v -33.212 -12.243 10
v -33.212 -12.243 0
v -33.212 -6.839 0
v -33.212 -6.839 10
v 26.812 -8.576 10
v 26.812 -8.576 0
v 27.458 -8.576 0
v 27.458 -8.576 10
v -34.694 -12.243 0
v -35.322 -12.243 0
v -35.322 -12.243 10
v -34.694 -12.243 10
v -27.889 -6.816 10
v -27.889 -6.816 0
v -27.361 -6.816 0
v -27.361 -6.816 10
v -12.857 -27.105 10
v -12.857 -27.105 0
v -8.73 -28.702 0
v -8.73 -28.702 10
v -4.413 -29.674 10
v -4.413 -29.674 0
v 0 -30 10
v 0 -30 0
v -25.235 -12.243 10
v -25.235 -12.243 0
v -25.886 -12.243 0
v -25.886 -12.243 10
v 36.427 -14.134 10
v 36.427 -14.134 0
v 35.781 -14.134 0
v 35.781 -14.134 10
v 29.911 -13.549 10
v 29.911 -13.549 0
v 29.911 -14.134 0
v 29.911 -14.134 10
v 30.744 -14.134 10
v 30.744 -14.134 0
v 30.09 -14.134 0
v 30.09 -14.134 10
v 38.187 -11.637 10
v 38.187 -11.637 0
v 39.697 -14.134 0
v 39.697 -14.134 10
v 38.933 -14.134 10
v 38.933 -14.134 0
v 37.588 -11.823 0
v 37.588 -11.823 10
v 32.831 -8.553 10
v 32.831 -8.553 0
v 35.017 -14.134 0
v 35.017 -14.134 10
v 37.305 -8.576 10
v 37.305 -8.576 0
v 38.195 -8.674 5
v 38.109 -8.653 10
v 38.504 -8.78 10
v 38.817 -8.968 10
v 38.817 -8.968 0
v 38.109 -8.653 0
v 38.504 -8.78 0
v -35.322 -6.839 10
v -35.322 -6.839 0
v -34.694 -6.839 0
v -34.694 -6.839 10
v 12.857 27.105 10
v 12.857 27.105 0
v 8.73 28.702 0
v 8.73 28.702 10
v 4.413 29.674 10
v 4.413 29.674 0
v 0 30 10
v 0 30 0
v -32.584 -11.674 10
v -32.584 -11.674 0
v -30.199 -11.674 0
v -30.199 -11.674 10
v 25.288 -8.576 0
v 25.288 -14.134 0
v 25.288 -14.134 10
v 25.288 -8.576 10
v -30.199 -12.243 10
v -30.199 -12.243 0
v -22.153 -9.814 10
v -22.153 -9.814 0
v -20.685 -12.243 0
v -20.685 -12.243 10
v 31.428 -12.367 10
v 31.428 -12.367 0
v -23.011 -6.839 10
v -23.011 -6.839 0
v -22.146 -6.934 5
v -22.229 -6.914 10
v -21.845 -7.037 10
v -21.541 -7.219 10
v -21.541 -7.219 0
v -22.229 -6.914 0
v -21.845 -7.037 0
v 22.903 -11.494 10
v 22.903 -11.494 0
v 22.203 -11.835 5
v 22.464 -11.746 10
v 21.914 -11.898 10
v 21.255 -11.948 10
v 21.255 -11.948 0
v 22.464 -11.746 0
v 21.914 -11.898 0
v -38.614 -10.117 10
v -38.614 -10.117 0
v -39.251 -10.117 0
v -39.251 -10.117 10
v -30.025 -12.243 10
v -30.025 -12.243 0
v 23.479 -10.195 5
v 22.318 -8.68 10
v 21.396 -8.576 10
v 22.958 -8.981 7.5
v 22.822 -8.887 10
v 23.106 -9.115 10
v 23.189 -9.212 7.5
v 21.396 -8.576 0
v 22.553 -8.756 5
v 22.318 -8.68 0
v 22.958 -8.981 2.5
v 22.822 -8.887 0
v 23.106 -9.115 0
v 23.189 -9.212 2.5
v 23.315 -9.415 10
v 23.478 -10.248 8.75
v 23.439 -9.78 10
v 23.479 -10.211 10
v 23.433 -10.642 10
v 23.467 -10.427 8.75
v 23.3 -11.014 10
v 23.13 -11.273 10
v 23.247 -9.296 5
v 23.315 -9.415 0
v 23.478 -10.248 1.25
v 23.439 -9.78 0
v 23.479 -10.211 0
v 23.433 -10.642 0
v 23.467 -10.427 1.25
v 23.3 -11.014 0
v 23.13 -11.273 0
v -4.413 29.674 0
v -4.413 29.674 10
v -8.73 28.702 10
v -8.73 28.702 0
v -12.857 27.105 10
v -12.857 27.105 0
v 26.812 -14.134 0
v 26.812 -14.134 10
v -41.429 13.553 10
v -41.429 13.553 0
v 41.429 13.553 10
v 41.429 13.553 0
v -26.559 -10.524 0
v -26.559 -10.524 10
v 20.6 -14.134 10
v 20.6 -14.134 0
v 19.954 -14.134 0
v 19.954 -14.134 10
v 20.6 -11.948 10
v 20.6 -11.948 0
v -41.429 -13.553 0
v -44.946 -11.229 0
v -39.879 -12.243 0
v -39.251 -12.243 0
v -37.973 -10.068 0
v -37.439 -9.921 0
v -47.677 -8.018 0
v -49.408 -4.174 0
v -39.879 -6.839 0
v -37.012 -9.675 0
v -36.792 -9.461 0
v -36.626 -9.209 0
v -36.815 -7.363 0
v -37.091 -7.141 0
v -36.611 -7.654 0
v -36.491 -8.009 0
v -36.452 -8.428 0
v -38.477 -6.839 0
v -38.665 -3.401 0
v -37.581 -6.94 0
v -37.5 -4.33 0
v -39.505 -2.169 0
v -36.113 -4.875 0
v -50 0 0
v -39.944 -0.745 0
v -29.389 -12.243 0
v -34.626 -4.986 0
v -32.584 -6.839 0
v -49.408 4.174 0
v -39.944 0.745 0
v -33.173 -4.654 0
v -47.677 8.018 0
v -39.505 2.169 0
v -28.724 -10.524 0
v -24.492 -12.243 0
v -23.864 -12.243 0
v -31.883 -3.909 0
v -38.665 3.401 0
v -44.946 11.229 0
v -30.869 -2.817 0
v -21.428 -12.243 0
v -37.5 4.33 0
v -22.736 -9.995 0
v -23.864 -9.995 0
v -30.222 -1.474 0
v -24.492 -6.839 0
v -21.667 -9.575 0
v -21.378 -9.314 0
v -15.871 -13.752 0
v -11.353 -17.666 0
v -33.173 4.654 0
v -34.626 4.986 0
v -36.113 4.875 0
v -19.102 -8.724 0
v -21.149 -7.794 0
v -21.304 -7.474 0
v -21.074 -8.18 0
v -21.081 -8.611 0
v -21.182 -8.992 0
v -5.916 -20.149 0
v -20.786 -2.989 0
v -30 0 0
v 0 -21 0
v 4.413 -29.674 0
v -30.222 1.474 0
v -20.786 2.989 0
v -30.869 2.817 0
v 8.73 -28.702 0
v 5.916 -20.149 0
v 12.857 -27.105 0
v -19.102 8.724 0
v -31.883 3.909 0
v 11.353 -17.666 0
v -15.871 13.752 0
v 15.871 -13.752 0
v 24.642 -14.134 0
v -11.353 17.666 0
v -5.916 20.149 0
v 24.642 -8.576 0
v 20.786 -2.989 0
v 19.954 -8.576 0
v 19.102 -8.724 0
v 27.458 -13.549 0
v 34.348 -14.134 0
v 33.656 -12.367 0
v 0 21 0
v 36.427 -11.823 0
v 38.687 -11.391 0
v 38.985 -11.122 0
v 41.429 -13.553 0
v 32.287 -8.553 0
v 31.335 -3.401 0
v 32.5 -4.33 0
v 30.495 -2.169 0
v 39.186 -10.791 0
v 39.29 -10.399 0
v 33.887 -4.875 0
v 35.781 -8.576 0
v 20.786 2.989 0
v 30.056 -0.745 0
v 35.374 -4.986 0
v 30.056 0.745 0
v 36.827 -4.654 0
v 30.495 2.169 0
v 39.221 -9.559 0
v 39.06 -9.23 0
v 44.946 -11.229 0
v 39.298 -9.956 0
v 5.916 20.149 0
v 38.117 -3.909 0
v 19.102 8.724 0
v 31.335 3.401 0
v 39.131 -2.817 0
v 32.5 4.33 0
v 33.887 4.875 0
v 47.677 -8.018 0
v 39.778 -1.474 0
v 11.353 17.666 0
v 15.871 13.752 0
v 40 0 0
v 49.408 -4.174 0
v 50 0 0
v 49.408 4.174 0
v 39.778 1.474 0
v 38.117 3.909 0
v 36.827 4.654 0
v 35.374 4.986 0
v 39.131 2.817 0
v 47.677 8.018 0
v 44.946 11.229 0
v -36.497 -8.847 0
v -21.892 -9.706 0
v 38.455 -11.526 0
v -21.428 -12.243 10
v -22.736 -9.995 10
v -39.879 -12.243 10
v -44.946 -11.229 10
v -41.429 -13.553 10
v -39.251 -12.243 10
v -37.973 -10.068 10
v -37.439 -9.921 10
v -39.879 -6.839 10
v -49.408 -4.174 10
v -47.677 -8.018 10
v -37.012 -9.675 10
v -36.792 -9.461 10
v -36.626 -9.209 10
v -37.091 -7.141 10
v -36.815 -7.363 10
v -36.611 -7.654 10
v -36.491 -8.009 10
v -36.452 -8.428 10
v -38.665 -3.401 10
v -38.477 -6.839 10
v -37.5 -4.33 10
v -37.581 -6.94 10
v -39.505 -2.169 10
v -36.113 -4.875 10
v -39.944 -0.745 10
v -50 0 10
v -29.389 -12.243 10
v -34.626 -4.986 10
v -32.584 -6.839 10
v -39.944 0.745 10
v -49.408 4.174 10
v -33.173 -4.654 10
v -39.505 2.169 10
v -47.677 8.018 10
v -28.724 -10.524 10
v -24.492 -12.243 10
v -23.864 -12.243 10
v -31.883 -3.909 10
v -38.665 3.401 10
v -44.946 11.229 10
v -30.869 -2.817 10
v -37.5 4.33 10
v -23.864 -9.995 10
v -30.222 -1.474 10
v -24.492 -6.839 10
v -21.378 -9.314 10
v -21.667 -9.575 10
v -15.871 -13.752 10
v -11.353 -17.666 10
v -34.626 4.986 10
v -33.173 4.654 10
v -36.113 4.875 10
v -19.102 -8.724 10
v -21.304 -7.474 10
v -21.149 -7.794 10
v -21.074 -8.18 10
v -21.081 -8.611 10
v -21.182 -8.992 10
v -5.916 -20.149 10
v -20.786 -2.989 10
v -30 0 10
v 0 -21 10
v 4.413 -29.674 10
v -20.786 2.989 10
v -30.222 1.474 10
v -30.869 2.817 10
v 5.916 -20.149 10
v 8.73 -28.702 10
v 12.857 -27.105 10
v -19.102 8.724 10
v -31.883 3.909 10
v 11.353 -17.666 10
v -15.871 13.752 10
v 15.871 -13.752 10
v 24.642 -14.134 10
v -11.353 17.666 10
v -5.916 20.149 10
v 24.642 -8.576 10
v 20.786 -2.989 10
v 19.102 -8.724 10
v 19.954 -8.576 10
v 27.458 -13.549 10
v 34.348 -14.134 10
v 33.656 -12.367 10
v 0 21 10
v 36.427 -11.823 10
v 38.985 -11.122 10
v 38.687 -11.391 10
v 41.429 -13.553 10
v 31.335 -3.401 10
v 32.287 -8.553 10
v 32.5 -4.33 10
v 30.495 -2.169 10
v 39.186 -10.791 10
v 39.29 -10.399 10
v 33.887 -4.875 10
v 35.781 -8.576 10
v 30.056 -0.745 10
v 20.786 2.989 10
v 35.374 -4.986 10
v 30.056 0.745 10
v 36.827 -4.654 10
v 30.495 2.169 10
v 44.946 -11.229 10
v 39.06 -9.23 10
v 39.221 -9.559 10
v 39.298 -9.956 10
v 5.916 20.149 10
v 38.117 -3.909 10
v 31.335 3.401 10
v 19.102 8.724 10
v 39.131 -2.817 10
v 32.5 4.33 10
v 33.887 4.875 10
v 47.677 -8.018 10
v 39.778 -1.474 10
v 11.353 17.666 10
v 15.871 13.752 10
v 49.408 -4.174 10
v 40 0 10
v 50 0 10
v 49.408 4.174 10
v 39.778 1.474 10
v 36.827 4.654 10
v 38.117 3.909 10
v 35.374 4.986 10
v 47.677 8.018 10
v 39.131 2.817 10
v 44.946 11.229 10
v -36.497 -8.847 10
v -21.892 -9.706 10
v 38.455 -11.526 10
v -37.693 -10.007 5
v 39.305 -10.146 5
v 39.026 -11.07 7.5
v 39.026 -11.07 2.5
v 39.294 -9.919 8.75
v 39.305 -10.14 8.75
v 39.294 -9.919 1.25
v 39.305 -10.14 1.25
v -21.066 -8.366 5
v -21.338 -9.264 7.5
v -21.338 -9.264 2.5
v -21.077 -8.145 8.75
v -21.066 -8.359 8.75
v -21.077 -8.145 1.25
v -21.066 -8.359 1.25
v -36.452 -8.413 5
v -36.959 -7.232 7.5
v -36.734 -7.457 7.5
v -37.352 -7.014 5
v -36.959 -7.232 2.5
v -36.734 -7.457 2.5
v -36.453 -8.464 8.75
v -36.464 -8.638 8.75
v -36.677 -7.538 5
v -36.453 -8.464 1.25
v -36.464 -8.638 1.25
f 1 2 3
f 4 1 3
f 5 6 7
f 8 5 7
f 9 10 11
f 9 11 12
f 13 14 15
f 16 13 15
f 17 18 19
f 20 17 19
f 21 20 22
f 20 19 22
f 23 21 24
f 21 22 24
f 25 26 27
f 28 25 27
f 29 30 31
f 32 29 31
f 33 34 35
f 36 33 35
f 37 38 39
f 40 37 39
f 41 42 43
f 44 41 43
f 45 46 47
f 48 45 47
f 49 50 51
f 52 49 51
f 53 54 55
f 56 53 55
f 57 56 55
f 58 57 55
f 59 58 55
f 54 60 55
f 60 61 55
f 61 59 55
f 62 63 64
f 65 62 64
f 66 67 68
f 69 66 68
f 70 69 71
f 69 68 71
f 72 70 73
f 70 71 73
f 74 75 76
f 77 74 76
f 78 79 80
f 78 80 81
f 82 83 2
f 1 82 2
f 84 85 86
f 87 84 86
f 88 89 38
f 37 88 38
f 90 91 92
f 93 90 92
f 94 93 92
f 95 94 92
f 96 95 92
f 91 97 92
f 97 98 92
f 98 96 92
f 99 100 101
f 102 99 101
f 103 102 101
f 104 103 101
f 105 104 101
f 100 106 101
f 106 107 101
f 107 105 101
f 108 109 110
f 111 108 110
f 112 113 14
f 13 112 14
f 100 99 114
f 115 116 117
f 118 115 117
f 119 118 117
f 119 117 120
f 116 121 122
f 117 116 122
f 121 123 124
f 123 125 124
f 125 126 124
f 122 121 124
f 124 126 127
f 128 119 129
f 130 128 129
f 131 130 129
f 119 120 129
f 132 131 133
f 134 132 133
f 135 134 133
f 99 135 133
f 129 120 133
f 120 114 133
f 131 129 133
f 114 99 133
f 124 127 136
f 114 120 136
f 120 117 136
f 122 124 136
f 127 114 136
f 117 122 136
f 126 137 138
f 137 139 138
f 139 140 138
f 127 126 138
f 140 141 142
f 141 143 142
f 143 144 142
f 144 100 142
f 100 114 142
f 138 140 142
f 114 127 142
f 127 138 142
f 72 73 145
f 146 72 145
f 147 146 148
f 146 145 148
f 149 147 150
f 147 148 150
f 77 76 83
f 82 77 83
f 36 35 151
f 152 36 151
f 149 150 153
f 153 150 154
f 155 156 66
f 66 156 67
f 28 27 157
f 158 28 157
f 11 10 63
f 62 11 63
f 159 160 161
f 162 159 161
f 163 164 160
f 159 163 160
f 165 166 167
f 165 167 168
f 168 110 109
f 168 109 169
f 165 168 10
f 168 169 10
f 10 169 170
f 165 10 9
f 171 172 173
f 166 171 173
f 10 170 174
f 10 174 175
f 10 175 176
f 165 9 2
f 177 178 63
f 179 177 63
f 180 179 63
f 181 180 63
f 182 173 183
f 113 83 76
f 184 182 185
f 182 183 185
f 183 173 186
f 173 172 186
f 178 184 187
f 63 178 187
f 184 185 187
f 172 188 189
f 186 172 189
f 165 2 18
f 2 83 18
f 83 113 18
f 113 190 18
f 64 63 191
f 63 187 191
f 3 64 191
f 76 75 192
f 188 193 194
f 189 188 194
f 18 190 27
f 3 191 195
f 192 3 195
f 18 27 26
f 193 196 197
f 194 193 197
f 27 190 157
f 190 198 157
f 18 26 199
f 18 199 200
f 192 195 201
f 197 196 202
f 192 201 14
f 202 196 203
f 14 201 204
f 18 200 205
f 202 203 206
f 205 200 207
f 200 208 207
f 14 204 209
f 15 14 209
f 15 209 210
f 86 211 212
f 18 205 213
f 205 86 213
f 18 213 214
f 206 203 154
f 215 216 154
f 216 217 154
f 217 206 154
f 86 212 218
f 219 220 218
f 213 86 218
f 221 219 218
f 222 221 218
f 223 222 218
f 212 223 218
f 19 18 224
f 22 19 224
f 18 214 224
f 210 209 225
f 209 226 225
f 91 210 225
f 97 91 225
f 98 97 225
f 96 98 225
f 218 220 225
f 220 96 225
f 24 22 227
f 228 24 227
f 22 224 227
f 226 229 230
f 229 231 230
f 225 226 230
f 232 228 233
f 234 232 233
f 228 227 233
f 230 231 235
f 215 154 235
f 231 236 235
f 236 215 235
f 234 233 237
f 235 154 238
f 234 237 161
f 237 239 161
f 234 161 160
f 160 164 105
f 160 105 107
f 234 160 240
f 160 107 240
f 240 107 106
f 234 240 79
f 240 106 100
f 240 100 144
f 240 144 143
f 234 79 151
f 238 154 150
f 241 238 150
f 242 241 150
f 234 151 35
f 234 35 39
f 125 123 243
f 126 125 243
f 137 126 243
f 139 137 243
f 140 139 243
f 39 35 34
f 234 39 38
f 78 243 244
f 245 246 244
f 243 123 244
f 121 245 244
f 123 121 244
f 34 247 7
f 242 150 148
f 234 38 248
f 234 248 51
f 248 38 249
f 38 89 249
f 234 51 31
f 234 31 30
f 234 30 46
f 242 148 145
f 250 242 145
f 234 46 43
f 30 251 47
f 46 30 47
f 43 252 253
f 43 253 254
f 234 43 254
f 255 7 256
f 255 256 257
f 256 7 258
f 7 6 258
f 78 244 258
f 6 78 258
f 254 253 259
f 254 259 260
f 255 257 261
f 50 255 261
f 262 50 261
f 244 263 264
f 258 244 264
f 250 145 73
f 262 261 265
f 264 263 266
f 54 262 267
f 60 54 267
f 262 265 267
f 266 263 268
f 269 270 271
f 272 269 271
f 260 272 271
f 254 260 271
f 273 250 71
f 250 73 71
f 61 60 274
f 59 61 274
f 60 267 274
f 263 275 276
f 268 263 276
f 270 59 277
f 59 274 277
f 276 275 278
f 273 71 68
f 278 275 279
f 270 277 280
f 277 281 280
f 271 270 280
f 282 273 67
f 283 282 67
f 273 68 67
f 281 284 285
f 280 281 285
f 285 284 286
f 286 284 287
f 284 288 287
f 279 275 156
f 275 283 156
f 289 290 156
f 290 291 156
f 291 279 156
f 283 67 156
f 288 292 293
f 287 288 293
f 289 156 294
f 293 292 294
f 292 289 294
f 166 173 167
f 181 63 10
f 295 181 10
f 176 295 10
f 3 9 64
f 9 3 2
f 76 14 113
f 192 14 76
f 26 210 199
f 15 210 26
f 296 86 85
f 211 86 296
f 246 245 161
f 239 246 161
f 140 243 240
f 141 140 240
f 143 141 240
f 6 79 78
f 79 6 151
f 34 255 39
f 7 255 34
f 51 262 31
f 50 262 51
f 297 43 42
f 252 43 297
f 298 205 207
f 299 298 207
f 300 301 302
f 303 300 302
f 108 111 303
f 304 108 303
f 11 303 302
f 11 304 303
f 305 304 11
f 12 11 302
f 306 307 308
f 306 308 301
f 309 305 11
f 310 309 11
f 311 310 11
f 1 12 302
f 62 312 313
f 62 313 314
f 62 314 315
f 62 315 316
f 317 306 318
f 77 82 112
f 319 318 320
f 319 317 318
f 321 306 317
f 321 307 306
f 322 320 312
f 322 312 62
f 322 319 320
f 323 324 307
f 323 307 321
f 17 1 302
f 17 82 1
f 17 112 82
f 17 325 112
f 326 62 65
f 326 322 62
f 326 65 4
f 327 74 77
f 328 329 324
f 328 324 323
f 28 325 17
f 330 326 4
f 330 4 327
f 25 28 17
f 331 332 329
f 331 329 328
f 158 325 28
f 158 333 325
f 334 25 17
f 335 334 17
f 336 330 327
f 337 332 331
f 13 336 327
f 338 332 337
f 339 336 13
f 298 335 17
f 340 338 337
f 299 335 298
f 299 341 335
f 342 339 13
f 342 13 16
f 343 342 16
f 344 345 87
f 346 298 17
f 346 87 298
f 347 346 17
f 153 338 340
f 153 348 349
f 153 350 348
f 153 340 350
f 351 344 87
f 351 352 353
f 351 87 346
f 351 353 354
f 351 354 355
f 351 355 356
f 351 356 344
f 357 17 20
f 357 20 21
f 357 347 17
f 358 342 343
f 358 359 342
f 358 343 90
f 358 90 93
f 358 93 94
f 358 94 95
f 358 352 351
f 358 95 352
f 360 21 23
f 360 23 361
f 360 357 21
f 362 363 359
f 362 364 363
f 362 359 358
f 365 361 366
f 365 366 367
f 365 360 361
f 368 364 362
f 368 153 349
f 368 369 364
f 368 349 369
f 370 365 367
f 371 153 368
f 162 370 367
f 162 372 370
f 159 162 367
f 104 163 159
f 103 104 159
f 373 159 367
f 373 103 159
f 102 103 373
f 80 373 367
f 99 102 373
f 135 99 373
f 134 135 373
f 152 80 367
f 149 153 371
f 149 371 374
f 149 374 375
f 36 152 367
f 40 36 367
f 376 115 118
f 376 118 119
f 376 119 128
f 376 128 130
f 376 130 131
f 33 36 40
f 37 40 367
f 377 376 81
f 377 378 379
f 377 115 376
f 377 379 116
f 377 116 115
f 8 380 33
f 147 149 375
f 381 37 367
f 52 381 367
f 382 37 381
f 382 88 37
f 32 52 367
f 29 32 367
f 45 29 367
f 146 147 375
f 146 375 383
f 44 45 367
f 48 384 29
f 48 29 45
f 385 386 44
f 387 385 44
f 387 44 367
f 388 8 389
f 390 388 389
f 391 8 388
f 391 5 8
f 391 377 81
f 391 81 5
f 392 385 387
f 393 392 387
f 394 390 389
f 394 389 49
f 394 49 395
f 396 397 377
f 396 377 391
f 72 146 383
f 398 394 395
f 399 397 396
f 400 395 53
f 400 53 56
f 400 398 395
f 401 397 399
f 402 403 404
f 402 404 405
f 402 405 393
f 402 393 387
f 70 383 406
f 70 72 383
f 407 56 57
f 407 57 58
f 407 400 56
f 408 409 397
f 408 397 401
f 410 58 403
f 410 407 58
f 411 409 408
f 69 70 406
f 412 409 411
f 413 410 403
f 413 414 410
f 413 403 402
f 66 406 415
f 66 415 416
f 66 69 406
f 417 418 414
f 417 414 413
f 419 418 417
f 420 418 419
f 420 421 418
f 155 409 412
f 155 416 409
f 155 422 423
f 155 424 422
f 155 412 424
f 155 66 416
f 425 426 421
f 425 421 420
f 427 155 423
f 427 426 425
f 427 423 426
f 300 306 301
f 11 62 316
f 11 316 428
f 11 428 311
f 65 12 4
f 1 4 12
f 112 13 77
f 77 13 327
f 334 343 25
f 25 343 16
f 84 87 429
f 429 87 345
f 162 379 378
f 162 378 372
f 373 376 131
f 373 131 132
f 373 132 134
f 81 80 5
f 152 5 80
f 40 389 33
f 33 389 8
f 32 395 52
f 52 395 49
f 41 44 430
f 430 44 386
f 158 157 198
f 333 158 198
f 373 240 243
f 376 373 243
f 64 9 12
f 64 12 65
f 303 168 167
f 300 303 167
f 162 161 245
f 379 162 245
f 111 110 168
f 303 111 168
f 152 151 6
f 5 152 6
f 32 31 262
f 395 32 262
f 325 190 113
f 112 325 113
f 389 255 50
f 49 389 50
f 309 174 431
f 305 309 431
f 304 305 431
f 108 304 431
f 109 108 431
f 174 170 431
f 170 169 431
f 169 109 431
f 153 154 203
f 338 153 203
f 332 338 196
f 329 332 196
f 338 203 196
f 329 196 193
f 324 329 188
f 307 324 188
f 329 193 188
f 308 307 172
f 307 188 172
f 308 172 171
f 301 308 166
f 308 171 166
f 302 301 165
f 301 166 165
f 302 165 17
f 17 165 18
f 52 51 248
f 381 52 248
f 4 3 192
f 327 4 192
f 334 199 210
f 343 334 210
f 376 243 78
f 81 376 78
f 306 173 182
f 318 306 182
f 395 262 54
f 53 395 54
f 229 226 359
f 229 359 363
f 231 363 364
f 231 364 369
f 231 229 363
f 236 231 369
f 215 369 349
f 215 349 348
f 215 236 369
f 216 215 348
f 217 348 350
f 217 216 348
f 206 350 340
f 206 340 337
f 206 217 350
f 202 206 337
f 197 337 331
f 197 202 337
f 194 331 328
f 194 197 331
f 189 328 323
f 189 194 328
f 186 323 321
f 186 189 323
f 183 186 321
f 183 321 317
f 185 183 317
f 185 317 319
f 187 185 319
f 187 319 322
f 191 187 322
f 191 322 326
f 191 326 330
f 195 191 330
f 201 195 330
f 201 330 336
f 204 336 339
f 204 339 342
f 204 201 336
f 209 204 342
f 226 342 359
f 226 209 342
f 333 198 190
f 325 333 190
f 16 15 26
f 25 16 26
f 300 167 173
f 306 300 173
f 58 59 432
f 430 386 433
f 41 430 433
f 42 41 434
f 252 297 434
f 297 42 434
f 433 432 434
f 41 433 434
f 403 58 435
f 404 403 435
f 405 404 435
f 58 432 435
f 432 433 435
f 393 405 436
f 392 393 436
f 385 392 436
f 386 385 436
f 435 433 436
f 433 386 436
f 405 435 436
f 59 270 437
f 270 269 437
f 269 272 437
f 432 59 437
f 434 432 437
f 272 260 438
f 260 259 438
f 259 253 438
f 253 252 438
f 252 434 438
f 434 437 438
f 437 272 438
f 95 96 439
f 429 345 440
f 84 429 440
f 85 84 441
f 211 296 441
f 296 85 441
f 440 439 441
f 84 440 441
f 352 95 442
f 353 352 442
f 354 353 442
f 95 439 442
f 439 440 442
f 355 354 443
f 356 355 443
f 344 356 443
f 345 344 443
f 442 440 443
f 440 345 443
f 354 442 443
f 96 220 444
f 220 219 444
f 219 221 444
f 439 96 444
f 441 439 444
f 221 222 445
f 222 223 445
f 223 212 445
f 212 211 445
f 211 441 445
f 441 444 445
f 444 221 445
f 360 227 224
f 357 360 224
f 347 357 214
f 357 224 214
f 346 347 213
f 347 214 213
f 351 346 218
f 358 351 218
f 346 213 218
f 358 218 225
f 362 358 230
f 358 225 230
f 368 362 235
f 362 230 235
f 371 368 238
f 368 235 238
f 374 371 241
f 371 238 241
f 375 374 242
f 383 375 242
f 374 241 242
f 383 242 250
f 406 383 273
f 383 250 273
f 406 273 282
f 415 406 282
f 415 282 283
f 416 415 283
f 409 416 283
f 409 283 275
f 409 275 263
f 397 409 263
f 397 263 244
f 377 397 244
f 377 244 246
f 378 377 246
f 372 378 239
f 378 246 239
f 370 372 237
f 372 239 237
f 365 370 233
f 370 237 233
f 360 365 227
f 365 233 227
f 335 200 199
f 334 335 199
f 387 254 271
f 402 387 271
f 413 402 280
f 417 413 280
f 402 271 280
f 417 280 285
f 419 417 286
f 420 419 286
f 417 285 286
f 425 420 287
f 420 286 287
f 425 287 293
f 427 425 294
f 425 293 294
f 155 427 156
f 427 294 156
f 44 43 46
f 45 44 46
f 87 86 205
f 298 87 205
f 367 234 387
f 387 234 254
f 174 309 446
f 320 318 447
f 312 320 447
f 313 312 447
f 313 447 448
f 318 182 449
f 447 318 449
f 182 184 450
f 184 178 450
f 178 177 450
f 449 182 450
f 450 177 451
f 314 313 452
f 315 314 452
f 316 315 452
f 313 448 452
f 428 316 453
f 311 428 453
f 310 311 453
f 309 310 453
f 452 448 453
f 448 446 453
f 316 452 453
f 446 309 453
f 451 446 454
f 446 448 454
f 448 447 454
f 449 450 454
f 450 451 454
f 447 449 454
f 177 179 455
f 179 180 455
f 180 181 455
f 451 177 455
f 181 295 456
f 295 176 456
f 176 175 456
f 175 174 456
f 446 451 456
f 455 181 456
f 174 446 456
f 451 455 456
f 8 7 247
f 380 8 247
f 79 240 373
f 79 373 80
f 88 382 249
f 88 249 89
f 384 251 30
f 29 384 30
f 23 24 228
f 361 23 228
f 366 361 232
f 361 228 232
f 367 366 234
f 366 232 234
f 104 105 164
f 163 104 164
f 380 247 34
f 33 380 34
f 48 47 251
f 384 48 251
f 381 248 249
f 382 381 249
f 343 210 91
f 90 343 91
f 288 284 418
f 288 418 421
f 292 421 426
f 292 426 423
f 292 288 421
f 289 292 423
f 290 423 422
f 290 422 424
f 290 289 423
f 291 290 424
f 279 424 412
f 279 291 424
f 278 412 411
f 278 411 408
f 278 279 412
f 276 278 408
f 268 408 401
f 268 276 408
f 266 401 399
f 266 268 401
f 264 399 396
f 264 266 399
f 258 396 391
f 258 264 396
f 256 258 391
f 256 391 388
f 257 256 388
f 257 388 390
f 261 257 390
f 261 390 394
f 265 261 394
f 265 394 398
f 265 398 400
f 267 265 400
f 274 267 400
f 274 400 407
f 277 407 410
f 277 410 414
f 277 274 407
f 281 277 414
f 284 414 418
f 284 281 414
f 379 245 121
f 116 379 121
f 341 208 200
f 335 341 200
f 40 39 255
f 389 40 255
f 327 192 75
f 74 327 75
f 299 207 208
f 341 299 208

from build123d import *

# Parameters (mm, degrees)
F0_W     = 0.6460093453
F0_H     = 5.5586001861
F0_R     = 5
F0_W_2   = 0.6280364187
F0_H_2   = 5.4039517833
F1_DEPTH = 10


with BuildPart() as f1:
    # F0 (on Top) → F1 (new body)
    with BuildSketch(Plane.XY):
        with BuildLine():
            ThreePointArc((0, 21), (21, 0), (0, -21))
            Line((0, -21), (0, -30))
            ThreePointArc((0, -30), (6.5894949497, -29.2673633303), (12.8571428571, -27.1052370872))
            Line((12.8571428571, -27.1052370872), (41.4285714286, -13.5526185436))
            ThreePointArc((41.4285714286, -13.5526185436), (50, 0), (41.4285714286, 13.5526185436))
            Line((41.4285714286, 13.5526185436), (12.8571428571, 27.1052370872))
            ThreePointArc((12.8571428571, 27.1052370872), (6.5894949497, 29.2673633303), (0, 30))
            Line((0, 30), (0, 21))
        make_face()
        with BuildLine():
            add(Edge.make_bspline(
                [(21.3959532578, -8.5758308066), (23.4787555162, -8.5758308066), (23.4787555162, -10.1951122353)],
                knots=[0, 0, 0, 1, 1, 1], degree=2))
            add(Edge.make_bspline(
                [(23.4787555162, -10.1951122353), (23.4787555162, -11.0394257676), (22.9027001019, -11.4938221715)],
                knots=[0, 0, 0, 1, 1, 1], degree=2))
            add(Edge.make_bspline(
                [(22.9027001019, -11.4938221715), (22.3266446875, -11.9482185755), (21.2548288057, -11.9482185755)],
                knots=[0, 0, 0, 1, 1, 1], degree=2))
            Line((21.2548288057, -11.9482185755), (20.6003033297, -11.9482185755))
            Line((20.6003033297, -11.9482185755), (20.6003033297, -14.1344309927))
            Line((20.6003033297, -14.1344309927), (19.9542939844, -14.1344309927))
            Line((19.9542939844, -14.1344309927), (19.9542939844, -8.5758308066))
            Line((19.9542939844, -8.5758308066), (21.3959532578, -8.5758308066))
        make_face(mode=Mode.SUBTRACT)
        with Locations((24.9648203285, -11.3551308997)):
            Rectangle(F0_W, F0_H, mode=Mode.SUBTRACT)
        Polygon((29.9108673971, -14.1344309927), (26.8122124017, -14.1344309927), (26.8122124017, -8.5758308066), (27.458221747, -8.5758308066), (27.458221747, -13.5492511526), (29.9108673971, -13.5492511526), align=None, mode=Mode.SUBTRACT)
        Polygon((35.0168960644, -14.1344309927), (34.347771507, -14.1344309927), (33.6555317378, -12.3667255713), (31.427955257, -12.3667255713), (30.7442316184, -14.1344309927), (30.0897061424, -14.1344309927), (32.2868678705, -8.5527155947), (32.8306836471, -8.5527155947), align=None, mode=Mode.SUBTRACT)
        with BuildLine():
            Line((37.5875509545, -11.8229097947), (36.4269239951, -11.8229097947))
            Line((36.4269239951, -11.8229097947), (36.4269239951, -14.1344309927))
            Line((36.4269239951, -14.1344309927), (35.7809146498, -14.1344309927))
            Line((35.7809146498, -14.1344309927), (35.7809146498, -8.5758308066))
            Line((35.7809146498, -8.5758308066), (37.3053020503, -8.5758308066))
            add(Edge.make_bspline(
                [(37.3053020503, -8.5758308066), (38.328454328, -8.5758308066), (38.8169152548, -8.9675728202)],
                knots=[0, 0, 0, 1, 1, 1], degree=2))
            add(Edge.make_bspline(
                [(38.8169152548, -8.9675728202), (39.3053761816, -9.3593148337), (39.3053761816, -10.1464486312)],
                knots=[0, 0, 0, 1, 1, 1], degree=2))
            add(Edge.make_bspline(
                [(39.3053761816, -10.1464486312), (39.3053761816, -11.2486792655), (38.1873298759, -11.6367715088)],
                knots=[0, 0, 0, 1, 1, 1], degree=2))
            Line((38.1873298759, -11.6367715088), (39.6971181952, -14.1344309927))
            Line((39.6971181952, -14.1344309927), (38.9330996097, -14.1344309927))
            Line((38.9330996097, -14.1344309927), (37.5875509545, -11.8229097947))
        make_face(mode=Mode.SUBTRACT)
        with Locations((35, 0)):
            Circle(F0_R, mode=Mode.SUBTRACT)
        with BuildLine():
            Line((0, -30), (0, -21))
            ThreePointArc((0, -21), (-21, 0), (0, 21))
            Line((0, 21), (0, 30))
            ThreePointArc((0, 30), (-6.5894949497, 29.2673633303), (-12.8571428571, 27.1052370872))
            Line((-12.8571428571, 27.1052370872), (-41.4285714286, 13.5526185436))
            ThreePointArc((-41.4285714286, 13.5526185436), (-50, 0), (-41.4285714286, -13.5526185436))
            Line((-41.4285714286, -13.5526185436), (-12.8571428571, -27.1052370872))
            ThreePointArc((-12.8571428571, -27.1052370872), (-6.5894949497, -29.2673633303), (0, -30))
        make_face()
        with BuildLine():
            add(Edge.make_bspline(
                [(-38.4772362224, -6.8385926591), (-36.452380575, -6.8385926591), (-36.452380575, -8.4128233056)],
                knots=[0, 0, 0, 1, 1, 1], degree=2))
            add(Edge.make_bspline(
                [(-36.452380575, -8.4128233056), (-36.452380575, -9.2336467981), (-37.0124092836, -9.6754012282)],
                knots=[0, 0, 0, 1, 1, 1], degree=2))
            add(Edge.make_bspline(
                [(-37.0124092836, -9.6754012282), (-37.5724379921, -10.1171556583), (-38.6144343854, -10.1171556583)],
                knots=[0, 0, 0, 1, 1, 1], degree=2))
            Line((-38.6144343854, -10.1171556583), (-39.2507500036, -10.1171556583))
            Line((-39.2507500036, -10.1171556583), (-39.2507500036, -12.2425444424))
            Line((-39.2507500036, -12.2425444424), (-39.8787864223, -12.2425444424))
            Line((-39.8787864223, -12.2425444424), (-39.8787864223, -6.8385926591))
            Line((-39.8787864223, -6.8385926591), (-38.4772362224, -6.8385926591))
        make_face(mode=Mode.SUBTRACT)
        with Locations((-35.0076602635, -9.5405685508)):
            Rectangle(F0_W_2, F0_H_2, mode=Mode.SUBTRACT)
        Polygon((-30.1992194723, -12.2425444424), (-33.2116653449, -12.2425444424), (-33.2116653449, -6.8385926591), (-32.5836289263, -6.8385926591), (-32.5836289263, -11.673645163), (-30.1992194723, -11.673645163), align=None, mode=Mode.SUBTRACT)
        Polygon((-25.2352480049, -12.2425444424), (-25.8857565365, -12.2425444424), (-26.558737181, -10.5240191762), (-28.7243392198, -10.5240191762), (-29.3890406648, -12.2425444424), (-30.025356283, -12.2425444424), (-27.8893228138, -6.8161205462), (-27.360636789, -6.8161205462), align=None, mode=Mode.SUBTRACT)
        with Locations((-35, 0)):
            Circle(F0_R, mode=Mode.SUBTRACT)
        with BuildLine():
            Line((-22.7361125009, -9.9953331515), (-23.8644491175, -9.9953331515))
            Line((-23.8644491175, -9.9953331515), (-23.8644491175, -12.2425444424))
            Line((-23.8644491175, -12.2425444424), (-24.4924855361, -12.2425444424))
            Line((-24.4924855361, -12.2425444424), (-24.4924855361, -6.8385926591))
            Line((-24.4924855361, -6.8385926591), (-23.0105088269, -6.8385926591))
            add(Edge.make_bspline(
                [(-23.0105088269, -6.8385926591), (-22.015822145, -6.8385926591), (-21.5409509169, -7.2194358358)],
                knots=[0, 0, 0, 1, 1, 1], degree=2))
            add(Edge.make_bspline(
                [(-21.5409509169, -7.2194358358), (-21.0660796889, -7.6002790125), (-21.0660796889, -8.3655135942)],
                knots=[0, 0, 0, 1, 1, 1], degree=2))
            add(Edge.make_bspline(
                [(-21.0660796889, -8.3655135942), (-21.0660796889, -9.4370785571), (-22.153020308, -9.8143735054)],
                knots=[0, 0, 0, 1, 1, 1], degree=2))
            Line((-22.153020308, -9.8143735054), (-20.6852365122, -12.2425444424))
            Line((-20.6852365122, -12.2425444424), (-21.427998981, -12.2425444424))
            Line((-21.427998981, -12.2425444424), (-22.7361125009, -9.9953331515))
        make_face(mode=Mode.SUBTRACT)
    extrude(amount=F1_DEPTH)


solid = f1.part
